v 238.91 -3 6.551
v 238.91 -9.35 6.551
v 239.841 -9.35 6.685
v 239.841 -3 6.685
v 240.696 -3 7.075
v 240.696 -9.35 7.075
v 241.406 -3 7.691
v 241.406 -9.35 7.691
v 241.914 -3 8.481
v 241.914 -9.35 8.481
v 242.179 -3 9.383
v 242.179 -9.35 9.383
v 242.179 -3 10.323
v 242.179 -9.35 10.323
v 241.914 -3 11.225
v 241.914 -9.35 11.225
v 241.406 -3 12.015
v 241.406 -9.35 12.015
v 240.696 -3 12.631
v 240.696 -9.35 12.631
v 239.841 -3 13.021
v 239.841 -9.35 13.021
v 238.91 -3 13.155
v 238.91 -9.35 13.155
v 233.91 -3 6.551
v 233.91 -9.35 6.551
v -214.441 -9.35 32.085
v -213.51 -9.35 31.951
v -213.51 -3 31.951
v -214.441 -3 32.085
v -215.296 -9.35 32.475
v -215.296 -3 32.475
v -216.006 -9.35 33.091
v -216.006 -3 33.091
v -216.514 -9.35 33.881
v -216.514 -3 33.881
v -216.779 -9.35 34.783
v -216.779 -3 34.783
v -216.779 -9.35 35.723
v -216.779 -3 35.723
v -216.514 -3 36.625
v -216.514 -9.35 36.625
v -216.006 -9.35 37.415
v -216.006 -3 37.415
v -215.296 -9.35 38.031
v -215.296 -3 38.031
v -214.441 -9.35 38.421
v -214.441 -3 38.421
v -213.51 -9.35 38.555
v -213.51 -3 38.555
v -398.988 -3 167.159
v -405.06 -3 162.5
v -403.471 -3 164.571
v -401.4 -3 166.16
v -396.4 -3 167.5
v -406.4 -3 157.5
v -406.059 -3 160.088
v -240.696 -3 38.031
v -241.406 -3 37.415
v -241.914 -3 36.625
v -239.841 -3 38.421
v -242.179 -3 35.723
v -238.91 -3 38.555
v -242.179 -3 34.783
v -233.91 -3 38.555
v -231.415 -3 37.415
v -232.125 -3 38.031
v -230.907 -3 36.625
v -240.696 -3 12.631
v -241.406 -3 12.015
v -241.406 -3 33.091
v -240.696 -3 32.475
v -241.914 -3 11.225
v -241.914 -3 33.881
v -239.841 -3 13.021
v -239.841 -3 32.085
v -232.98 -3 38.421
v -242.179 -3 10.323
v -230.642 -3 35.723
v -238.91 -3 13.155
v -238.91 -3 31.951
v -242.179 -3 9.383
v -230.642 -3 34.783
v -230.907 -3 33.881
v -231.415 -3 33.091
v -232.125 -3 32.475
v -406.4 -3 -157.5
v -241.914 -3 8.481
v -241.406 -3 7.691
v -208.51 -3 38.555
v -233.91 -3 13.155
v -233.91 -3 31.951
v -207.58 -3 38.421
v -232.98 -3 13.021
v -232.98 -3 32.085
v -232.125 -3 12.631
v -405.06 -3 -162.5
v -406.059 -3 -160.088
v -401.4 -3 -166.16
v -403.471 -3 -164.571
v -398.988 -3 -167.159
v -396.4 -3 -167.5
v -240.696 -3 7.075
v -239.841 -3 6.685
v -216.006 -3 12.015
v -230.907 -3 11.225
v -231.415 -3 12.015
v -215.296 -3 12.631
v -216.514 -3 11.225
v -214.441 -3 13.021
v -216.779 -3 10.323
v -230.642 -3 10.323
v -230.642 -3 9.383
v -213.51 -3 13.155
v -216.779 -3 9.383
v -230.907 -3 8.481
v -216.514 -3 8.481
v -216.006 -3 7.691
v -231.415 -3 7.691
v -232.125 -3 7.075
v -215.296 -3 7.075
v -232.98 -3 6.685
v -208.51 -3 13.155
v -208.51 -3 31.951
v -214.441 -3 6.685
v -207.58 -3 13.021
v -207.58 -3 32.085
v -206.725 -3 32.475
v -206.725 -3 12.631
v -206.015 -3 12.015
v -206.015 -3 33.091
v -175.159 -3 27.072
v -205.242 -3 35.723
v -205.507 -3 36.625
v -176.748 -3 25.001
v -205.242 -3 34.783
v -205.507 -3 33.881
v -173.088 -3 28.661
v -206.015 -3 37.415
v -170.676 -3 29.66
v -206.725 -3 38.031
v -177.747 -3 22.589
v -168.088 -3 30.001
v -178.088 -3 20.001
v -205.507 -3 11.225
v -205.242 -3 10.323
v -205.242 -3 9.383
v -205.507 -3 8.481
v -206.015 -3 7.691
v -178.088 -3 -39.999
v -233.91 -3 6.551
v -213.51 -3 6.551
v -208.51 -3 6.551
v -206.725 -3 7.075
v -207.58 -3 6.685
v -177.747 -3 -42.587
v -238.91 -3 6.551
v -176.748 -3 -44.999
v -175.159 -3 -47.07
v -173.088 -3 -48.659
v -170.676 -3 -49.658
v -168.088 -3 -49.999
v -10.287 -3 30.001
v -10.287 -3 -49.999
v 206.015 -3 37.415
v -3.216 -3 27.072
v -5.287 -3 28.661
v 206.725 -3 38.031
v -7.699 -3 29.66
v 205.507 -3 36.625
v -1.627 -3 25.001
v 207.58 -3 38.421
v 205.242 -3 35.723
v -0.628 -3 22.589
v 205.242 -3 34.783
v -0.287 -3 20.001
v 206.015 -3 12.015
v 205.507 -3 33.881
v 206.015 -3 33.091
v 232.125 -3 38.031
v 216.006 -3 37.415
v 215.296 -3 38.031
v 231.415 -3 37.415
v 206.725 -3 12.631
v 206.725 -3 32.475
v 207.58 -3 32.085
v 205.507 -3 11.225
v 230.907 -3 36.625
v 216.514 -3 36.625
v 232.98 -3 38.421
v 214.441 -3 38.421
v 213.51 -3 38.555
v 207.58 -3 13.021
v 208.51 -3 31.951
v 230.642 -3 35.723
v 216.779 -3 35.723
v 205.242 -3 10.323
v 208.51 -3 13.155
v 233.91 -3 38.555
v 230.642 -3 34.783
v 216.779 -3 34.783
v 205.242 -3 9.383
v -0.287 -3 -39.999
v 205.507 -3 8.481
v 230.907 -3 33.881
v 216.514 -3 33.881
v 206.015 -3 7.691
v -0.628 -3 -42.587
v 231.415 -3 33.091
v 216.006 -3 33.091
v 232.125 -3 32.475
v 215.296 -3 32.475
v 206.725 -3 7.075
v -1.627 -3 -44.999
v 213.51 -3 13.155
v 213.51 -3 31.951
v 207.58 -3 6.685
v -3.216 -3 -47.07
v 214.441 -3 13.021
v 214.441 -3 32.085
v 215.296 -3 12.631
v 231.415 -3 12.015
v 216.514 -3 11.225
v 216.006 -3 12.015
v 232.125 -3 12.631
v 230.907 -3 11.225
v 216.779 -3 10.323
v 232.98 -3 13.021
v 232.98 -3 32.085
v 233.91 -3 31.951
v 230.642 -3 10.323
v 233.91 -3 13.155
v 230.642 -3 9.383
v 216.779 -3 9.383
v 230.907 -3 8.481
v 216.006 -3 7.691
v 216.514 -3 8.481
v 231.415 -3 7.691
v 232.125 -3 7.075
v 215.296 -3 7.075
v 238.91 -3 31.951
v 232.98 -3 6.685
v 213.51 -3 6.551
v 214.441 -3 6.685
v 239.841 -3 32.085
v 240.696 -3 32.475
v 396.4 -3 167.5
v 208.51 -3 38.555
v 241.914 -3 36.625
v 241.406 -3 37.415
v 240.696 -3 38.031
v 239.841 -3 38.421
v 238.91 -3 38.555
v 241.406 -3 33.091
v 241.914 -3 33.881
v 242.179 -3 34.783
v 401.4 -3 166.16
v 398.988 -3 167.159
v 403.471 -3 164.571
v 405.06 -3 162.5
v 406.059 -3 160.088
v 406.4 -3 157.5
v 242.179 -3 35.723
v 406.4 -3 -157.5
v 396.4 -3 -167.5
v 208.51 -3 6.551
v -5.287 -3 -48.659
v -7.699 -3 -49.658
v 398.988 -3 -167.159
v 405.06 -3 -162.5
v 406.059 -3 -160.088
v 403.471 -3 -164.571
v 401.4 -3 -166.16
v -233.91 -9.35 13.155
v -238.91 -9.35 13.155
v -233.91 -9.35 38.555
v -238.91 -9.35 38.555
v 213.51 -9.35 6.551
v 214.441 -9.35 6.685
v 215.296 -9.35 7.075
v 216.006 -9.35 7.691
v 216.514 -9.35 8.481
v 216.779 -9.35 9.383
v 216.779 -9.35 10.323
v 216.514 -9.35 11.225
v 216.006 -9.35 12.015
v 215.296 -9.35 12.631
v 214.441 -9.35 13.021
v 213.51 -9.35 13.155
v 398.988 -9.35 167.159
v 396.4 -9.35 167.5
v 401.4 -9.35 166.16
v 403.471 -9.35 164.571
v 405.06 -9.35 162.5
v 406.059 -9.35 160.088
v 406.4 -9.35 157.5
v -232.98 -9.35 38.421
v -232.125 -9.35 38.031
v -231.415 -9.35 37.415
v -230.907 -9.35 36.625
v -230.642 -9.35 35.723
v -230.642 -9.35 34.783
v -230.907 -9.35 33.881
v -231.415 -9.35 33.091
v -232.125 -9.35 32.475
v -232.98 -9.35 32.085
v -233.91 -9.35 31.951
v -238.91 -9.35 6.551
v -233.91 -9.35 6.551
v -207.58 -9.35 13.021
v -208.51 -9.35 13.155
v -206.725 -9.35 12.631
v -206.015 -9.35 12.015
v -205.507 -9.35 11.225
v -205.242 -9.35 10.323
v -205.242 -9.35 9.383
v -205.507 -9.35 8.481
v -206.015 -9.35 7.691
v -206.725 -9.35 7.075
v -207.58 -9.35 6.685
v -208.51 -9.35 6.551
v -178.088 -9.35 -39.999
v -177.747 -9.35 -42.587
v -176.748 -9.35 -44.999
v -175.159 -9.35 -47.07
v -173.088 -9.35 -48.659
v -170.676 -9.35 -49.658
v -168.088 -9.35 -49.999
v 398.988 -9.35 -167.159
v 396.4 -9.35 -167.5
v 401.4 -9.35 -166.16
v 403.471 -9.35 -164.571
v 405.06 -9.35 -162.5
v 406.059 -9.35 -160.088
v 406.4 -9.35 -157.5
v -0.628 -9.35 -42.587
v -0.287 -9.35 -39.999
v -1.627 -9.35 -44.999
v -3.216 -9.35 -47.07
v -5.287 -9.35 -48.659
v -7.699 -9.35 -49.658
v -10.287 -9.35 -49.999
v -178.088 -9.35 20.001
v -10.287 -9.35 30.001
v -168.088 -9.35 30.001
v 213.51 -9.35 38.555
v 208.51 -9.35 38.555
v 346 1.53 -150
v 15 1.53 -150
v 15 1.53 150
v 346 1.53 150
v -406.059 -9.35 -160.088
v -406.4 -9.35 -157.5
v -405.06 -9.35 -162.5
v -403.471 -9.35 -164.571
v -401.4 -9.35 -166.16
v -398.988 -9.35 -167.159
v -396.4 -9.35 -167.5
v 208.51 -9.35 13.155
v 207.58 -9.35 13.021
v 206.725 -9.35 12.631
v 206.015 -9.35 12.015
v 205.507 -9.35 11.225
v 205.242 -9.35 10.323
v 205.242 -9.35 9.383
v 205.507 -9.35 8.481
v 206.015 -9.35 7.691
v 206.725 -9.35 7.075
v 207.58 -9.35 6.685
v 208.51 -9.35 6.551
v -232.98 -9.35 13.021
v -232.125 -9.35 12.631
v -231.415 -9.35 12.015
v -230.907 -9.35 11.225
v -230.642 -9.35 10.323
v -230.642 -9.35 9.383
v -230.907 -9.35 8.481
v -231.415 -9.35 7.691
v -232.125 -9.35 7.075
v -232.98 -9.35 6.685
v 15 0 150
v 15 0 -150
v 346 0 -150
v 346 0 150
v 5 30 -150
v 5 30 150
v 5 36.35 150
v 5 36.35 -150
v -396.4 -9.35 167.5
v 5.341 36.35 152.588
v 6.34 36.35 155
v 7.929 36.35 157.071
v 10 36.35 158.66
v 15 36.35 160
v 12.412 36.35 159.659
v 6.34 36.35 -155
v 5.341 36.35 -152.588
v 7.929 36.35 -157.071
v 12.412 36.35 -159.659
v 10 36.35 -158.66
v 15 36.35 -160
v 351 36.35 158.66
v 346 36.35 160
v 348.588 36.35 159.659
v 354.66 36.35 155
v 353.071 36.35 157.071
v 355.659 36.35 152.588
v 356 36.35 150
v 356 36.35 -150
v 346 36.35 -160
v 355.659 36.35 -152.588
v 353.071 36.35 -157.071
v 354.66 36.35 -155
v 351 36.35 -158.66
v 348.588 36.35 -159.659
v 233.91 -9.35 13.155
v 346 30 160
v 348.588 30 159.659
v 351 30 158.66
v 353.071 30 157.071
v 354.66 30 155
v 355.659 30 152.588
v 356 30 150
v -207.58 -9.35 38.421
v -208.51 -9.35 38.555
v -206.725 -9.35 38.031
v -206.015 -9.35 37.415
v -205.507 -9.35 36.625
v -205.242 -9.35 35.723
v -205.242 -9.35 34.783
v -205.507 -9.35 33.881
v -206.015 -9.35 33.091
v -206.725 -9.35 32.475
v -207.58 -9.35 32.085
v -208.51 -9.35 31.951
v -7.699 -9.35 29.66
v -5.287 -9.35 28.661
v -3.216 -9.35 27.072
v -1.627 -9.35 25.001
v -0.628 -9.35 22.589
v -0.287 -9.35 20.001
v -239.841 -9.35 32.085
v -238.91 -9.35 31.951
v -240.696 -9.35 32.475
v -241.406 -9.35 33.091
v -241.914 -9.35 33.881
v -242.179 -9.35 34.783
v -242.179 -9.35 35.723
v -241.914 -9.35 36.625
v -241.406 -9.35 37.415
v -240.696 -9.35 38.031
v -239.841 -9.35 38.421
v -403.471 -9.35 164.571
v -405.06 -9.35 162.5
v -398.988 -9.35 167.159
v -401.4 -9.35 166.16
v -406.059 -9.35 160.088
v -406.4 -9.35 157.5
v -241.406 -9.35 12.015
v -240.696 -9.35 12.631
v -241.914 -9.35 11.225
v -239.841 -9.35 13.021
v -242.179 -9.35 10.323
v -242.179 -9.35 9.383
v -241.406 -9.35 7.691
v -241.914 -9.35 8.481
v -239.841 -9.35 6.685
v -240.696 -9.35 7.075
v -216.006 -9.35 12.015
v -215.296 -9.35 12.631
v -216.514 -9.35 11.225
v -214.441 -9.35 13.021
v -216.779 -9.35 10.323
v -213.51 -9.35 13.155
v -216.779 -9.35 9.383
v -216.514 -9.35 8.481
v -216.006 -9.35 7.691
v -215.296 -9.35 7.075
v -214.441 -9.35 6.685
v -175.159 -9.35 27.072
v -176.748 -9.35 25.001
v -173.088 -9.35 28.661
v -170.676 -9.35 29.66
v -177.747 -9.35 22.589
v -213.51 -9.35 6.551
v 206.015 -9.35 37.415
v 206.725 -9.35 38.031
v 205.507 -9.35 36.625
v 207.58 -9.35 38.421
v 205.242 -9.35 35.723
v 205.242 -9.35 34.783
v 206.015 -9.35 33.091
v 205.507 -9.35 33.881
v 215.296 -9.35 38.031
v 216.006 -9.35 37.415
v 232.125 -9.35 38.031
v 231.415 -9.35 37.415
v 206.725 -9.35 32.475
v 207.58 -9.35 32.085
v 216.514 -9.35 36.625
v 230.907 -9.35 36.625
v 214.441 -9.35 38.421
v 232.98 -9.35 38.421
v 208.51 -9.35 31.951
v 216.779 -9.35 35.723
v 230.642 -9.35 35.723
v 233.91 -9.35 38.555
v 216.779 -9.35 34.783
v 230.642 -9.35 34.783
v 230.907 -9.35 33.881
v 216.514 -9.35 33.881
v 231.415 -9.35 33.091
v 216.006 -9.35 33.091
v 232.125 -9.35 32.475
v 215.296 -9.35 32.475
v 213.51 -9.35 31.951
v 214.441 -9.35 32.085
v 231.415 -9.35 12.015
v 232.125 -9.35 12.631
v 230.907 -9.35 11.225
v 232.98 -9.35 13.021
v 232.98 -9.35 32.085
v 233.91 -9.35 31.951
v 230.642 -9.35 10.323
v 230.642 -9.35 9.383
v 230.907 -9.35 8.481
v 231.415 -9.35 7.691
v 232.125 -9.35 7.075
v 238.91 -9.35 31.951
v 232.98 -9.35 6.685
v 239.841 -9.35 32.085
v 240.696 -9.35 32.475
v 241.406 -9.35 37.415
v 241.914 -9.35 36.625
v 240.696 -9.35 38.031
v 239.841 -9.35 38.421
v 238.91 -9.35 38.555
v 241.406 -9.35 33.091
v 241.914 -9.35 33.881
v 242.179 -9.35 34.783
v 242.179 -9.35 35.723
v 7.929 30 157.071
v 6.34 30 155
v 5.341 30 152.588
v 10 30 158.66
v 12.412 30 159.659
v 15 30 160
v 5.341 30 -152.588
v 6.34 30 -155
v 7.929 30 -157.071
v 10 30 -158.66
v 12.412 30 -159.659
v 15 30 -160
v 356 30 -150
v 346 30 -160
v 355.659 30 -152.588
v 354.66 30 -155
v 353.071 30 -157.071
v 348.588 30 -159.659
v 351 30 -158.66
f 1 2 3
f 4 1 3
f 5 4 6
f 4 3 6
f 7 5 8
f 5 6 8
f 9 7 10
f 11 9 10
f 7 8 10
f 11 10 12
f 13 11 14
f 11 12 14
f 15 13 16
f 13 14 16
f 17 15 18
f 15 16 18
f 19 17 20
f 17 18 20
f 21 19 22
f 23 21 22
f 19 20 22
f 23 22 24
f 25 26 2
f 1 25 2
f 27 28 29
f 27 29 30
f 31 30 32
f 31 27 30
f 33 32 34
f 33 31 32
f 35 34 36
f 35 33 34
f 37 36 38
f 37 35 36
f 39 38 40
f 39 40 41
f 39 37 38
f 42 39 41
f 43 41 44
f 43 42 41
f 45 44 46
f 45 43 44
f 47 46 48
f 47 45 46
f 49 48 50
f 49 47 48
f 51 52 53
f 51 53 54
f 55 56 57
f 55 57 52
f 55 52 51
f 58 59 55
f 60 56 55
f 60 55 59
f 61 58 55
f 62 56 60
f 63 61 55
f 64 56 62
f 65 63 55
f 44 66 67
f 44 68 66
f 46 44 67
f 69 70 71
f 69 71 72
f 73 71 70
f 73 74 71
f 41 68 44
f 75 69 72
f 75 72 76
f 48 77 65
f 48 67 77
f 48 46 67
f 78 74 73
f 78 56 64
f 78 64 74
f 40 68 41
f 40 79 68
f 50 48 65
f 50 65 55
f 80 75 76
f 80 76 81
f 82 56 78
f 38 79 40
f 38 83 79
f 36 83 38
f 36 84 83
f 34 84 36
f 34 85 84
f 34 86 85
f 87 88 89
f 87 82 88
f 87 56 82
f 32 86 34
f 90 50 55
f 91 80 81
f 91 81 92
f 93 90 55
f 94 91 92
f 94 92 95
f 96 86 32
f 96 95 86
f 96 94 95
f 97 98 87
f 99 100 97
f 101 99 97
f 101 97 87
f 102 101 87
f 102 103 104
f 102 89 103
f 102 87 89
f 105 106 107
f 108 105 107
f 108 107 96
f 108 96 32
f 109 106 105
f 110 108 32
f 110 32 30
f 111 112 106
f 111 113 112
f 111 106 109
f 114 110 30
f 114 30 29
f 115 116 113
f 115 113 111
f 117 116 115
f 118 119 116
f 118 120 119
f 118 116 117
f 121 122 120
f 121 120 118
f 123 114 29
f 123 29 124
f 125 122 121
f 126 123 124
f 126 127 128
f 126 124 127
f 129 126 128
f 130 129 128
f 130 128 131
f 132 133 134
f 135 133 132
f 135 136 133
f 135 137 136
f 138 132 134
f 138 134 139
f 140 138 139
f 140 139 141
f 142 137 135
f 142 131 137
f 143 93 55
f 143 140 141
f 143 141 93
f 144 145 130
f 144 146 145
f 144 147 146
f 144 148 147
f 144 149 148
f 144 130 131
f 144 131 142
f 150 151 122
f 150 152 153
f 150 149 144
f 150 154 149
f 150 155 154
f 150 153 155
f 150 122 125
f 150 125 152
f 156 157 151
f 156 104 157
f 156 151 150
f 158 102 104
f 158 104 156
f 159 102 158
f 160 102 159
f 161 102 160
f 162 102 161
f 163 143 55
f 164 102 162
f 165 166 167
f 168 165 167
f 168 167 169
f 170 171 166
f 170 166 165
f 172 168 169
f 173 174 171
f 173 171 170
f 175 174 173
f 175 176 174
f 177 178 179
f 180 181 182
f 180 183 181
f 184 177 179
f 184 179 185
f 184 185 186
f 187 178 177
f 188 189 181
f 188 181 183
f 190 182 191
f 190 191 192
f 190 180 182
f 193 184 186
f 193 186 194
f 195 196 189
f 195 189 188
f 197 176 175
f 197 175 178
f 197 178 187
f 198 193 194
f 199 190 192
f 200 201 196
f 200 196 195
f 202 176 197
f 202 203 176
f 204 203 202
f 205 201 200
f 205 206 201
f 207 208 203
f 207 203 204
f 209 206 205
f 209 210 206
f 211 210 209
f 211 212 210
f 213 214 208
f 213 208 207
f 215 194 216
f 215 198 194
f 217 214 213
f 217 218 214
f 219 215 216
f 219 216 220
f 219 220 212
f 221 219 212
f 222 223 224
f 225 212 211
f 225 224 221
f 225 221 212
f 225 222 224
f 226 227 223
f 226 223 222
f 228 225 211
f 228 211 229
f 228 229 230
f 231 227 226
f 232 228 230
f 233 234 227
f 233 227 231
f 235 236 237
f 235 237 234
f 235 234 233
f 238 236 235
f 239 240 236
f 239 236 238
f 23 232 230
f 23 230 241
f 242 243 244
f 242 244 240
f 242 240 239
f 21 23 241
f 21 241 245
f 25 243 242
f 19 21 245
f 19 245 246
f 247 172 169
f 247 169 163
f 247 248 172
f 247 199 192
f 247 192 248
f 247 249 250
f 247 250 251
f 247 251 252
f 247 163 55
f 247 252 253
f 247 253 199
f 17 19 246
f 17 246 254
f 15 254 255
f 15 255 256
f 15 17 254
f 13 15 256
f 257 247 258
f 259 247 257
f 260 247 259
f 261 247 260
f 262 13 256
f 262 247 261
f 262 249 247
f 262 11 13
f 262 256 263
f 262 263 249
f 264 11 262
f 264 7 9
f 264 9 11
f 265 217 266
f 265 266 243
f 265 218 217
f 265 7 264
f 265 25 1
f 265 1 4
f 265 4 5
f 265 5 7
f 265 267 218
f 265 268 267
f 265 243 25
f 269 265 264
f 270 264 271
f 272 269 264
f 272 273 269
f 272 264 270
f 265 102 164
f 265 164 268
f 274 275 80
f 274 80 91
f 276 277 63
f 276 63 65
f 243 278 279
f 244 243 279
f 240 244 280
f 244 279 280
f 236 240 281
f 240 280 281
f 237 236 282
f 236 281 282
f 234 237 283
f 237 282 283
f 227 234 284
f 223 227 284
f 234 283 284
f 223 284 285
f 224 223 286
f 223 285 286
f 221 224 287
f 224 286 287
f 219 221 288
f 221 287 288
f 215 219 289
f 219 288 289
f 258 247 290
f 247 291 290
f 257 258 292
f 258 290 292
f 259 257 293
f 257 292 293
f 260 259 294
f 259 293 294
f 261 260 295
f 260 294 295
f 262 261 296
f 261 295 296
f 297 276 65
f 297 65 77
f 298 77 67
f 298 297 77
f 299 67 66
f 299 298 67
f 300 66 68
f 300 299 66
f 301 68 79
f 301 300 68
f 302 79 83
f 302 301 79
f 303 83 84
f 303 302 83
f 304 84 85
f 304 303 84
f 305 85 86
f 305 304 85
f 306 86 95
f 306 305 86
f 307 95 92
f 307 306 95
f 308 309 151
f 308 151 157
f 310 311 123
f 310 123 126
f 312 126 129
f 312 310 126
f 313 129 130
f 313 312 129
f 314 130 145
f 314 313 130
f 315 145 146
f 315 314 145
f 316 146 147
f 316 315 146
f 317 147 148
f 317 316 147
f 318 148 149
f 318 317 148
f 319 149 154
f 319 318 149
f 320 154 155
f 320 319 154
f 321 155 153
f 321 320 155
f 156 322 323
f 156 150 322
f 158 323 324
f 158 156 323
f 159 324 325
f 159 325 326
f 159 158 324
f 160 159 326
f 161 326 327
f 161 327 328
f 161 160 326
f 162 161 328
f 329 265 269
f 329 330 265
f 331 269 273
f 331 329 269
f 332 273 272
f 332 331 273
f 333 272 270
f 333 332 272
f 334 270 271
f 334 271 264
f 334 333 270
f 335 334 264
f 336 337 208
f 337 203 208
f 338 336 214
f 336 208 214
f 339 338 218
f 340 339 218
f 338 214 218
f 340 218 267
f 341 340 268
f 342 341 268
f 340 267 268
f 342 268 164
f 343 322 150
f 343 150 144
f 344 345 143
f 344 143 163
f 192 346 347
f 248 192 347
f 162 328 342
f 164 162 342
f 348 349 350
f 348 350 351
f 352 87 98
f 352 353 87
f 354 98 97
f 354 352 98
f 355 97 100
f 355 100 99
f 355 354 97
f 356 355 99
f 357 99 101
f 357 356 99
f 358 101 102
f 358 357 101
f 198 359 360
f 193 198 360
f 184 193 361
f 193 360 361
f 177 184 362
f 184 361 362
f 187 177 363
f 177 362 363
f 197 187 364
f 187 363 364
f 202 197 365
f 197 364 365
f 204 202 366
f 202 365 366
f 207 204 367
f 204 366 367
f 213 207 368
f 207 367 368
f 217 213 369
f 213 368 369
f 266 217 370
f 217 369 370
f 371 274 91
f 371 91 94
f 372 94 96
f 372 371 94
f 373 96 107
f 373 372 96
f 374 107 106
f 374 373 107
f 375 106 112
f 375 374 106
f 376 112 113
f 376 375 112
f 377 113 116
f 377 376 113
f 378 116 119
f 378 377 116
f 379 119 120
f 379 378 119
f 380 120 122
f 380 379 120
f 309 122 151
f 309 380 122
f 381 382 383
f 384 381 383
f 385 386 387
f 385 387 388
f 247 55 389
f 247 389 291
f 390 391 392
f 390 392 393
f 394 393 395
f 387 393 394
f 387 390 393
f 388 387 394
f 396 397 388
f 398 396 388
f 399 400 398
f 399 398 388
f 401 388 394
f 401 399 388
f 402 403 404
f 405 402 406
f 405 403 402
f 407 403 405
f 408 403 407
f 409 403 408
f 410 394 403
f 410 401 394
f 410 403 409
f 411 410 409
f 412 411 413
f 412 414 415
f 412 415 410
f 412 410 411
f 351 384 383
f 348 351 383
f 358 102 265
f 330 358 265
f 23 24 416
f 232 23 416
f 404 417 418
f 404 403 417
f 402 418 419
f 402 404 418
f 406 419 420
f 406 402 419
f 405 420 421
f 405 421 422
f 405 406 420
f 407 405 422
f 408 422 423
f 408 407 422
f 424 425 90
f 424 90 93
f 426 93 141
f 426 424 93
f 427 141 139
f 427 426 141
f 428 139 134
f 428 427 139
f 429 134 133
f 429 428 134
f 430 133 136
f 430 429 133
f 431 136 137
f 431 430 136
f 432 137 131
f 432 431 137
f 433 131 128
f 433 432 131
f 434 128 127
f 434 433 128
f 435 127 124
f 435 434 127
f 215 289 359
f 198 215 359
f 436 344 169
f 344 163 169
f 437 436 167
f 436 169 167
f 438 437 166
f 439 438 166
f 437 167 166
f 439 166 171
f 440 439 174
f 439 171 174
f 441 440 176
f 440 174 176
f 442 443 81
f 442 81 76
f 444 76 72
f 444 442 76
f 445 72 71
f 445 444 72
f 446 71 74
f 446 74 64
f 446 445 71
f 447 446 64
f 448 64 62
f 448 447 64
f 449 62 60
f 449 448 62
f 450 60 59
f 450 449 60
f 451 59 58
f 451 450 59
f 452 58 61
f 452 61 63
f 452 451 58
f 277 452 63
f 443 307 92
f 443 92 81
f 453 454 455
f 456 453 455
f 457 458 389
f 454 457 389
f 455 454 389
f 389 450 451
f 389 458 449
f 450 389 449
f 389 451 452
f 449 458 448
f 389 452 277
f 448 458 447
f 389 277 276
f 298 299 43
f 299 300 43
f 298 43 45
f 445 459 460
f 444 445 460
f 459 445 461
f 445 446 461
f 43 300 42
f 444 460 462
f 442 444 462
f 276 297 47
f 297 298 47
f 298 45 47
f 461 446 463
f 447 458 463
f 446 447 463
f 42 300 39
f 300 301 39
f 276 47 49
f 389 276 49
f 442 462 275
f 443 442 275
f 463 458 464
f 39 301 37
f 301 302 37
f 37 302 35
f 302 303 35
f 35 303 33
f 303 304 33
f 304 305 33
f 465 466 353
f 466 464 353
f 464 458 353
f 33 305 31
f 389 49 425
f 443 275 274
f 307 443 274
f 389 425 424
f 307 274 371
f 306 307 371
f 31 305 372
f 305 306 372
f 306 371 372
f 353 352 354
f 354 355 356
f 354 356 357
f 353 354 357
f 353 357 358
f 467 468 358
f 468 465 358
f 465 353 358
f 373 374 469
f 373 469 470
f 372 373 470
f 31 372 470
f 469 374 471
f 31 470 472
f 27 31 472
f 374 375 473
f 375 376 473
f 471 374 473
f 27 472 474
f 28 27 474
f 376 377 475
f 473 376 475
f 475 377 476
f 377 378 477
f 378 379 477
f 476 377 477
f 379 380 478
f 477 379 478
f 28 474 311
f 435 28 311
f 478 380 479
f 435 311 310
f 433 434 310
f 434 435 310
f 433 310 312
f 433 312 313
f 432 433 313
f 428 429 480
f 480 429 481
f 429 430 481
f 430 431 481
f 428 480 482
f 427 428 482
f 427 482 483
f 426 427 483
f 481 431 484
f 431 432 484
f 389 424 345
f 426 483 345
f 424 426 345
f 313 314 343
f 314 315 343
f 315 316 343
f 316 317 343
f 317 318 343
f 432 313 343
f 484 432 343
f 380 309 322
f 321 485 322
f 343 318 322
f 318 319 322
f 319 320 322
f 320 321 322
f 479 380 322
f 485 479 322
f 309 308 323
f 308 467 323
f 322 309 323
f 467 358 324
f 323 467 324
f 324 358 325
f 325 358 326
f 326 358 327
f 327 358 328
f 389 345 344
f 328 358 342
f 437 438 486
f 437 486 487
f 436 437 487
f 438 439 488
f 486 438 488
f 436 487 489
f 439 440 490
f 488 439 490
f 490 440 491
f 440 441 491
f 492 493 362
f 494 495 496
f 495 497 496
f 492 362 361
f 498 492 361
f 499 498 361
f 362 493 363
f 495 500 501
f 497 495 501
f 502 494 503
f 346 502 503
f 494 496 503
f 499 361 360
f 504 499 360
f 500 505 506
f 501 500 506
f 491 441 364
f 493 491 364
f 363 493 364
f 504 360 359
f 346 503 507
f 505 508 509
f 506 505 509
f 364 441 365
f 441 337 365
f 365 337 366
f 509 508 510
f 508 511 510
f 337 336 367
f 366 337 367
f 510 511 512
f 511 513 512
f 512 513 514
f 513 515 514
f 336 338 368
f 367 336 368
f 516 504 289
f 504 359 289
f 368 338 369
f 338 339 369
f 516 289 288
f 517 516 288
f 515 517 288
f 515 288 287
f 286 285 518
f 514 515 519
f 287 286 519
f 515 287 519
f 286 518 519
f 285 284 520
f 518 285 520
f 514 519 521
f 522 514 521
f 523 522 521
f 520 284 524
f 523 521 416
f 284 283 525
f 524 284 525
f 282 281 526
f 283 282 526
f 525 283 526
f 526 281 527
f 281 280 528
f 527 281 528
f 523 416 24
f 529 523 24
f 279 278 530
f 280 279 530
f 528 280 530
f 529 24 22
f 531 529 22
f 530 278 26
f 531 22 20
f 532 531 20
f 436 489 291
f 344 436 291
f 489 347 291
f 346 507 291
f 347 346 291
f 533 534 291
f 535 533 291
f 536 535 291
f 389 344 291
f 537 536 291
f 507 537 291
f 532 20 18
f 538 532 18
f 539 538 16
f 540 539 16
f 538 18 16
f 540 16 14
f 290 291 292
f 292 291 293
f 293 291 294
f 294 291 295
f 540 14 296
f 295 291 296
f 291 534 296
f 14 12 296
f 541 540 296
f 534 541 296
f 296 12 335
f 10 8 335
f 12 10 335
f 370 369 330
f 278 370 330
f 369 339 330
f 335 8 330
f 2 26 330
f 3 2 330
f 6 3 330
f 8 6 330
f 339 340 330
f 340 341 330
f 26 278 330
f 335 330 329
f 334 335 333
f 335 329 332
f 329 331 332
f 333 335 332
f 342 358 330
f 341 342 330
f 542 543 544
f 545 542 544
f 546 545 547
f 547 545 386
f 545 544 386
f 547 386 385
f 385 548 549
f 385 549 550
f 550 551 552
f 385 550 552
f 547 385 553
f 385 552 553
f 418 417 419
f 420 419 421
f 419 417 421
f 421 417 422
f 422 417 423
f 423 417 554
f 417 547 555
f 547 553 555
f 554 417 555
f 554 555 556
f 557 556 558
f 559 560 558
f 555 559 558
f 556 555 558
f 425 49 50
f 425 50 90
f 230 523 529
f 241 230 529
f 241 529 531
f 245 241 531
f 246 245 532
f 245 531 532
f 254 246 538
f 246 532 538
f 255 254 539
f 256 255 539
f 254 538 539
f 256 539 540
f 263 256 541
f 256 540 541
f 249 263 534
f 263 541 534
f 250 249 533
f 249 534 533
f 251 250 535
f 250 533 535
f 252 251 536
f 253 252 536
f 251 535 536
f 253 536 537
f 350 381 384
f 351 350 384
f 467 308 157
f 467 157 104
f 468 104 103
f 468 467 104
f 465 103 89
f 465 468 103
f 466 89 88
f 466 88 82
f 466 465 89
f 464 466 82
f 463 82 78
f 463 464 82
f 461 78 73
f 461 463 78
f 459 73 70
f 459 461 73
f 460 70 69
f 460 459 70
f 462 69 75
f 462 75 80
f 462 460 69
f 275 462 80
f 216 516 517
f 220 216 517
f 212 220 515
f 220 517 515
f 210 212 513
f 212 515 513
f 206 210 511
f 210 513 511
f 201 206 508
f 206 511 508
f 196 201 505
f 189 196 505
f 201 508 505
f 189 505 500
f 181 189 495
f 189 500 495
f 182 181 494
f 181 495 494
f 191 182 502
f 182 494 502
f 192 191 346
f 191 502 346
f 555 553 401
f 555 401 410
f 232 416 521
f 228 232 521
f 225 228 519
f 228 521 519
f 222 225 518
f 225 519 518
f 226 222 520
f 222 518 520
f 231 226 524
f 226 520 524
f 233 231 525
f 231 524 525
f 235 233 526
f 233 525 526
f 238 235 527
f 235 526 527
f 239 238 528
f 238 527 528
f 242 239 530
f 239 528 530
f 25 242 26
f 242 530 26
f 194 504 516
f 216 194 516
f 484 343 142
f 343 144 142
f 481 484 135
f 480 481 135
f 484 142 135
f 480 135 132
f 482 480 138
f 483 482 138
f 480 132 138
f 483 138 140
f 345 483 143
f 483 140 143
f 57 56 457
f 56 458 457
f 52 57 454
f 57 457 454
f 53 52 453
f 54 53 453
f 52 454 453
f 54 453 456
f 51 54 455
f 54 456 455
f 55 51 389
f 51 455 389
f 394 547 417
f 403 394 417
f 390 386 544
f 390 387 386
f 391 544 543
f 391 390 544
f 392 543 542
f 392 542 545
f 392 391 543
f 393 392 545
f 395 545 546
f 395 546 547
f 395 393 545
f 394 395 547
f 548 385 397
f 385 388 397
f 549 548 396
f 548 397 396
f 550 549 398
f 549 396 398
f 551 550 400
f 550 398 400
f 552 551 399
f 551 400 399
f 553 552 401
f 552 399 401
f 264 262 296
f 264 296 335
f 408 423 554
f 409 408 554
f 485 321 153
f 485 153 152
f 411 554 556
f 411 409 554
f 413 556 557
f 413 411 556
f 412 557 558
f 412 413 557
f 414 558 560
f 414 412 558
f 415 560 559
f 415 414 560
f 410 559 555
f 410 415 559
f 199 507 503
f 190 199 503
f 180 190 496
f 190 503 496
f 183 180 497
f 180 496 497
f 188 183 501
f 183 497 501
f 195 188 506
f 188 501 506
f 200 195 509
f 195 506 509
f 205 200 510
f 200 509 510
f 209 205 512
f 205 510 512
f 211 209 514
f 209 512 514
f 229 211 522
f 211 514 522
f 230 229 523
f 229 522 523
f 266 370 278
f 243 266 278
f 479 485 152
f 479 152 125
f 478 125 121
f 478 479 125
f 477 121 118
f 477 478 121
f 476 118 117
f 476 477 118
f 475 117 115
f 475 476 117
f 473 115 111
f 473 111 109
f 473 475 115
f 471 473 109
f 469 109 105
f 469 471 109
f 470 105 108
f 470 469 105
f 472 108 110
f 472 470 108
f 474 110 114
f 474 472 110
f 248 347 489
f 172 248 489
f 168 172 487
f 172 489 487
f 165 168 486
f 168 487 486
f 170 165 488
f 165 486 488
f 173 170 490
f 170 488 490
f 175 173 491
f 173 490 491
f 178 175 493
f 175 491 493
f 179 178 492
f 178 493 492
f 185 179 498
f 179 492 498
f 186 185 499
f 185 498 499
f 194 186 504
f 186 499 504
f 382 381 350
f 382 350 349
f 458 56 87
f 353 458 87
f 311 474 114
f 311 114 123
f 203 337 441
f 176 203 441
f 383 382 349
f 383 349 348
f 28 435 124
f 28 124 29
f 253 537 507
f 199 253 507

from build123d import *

# Parameters (mm, degrees)
SKETCH1_W           = 331
SKETCH1_H           = 300
BOSS_EXTRUDE1_DEPTH = 1.53
SKETCH3_W           = 812.8
SKETCH3_H           = 335
BOSS_EXTRUDE2_DEPTH = 6.35
CUT_EXTRUDE1_DEPTH  = 6.35
FILLET1_R           = 10
BOSS_EXTRUDE3_START = 30
SKETCH5_W           = 351
SKETCH5_H           = 320
BOSS_EXTRUDE3_DEPTH = 6.35
FILLET2_R           = 10
SKETCH6_W           = 177.8
SKETCH6_H           = 80
CUT_EXTRUDE2_DEPTH  = 6.35
FILLET3_R           = 10


with BuildPart() as part:
    # Sketch1 → Boss-Extrude1 (new body)
    with BuildSketch(Plane(origin=(0, 0, 0), x_dir=(1, 0, 0), z_dir=(0, 1, 0))):
        with Locations((180.5, 0)):
            Rectangle(SKETCH1_W, SKETCH1_H)
    extrude(amount=BOSS_EXTRUDE1_DEPTH)


with BuildPart() as body_2:
    # Sketch3 → Boss-Extrude2 (new body)
    with BuildSketch(Plane(origin=(0, -3, 0), x_dir=(1, 0, 0), z_dir=(0, 1, 0))):
        Rectangle(SKETCH3_W, SKETCH3_H)
    extrude(amount=-BOSS_EXTRUDE2_DEPTH)

    # Sketch4 → Cut-Extrude1 (cut)
    with BuildSketch(Plane.XZ.offset(9.35)):
        with BuildLine():
            Line((-208.5105, 6.550865079), (-213.5105, 6.550865079))
            ThreePointArc((-213.5105, 6.550865079), (-216.8125, 9.852865079), (-213.5105, 13.154865079))
            Line((-213.5105, 13.154865079), (-208.5105, 13.154865079))
            ThreePointArc((-208.5105, 13.154865079), (-205.2085, 9.852865079), (-208.5105, 6.550865079))
        make_face()
        with BuildLine():
            Line((-233.9105, 6.550865079), (-238.9105, 6.550865079))
            ThreePointArc((-238.9105, 6.550865079), (-242.2125, 9.852865079), (-238.9105, 13.154865079))
            Line((-238.9105, 13.154865079), (-233.9105, 13.154865079))
            ThreePointArc((-233.9105, 13.154865079), (-230.6085, 9.852865079), (-233.9105, 6.550865079))
        make_face()
        with BuildLine():
            Line((-208.5105, 31.950865079), (-213.5105, 31.950865079))
            ThreePointArc((-213.5105, 31.950865079), (-216.8125, 35.252865079), (-213.5105, 38.554865079))
            Line((-213.5105, 38.554865079), (-208.5105, 38.554865079))
            ThreePointArc((-208.5105, 38.554865079), (-205.2085, 35.252865079), (-208.5105, 31.950865079))
        make_face()
        with BuildLine():
            Line((-233.9105, 31.950865079), (-238.9105, 31.950865079))
            ThreePointArc((-238.9105, 31.950865079), (-242.2125, 35.252865079), (-238.9105, 38.554865079))
            Line((-238.9105, 38.554865079), (-233.9105, 38.554865079))
            ThreePointArc((-233.9105, 38.554865079), (-230.6085, 35.252865079), (-233.9105, 31.950865079))
        make_face()
    cut_extrude1 = extrude(amount=-CUT_EXTRUDE1_DEPTH, mode=Mode.SUBTRACT)

    # Mirror1: Cut-Extrude1 across plane
    add(cut_extrude1.mirror(Plane.ZY), mode=Mode.SUBTRACT)

    # Fillet1
    fillet1_edges = [body_2.edges().sort_by_distance(p)[0] for p in [
        (406.4, -6.175, 167.5),
        (-406.4, -6.175, 167.5),
        (-406.4, -6.175, -167.5),
        (406.4, -6.175, -167.5),
    ]]
    fillet(fillet1_edges, radius=FILLET1_R)

    # Sketch6 → Cut-Extrude2 (cut)
    with BuildSketch(Plane.XZ.offset(9.35)):
        with Locations((-89.1875, -9.999173431)):
            Rectangle(SKETCH6_W, SKETCH6_H)
    extrude(amount=-CUT_EXTRUDE2_DEPTH, mode=Mode.SUBTRACT)

    # Fillet3
    fillet3_edges = [body_2.edges().sort_by_distance(p)[0] for p in [
        (-0.2875, -6.175, 30.000826569),
        (-0.2875, -6.175, -49.999173431),
        (-178.0875, -6.175, -49.999173431),
        (-178.0875, -6.175, 30.000826569),
    ]]
    fillet(fillet3_edges, radius=FILLET3_R)


with BuildPart() as body_3:
    # Sketch5 → Boss-Extrude3 (new body)
    with BuildSketch(Plane(origin=(0, 0, 0), x_dir=(1, 0, 0), z_dir=(0, 1, 0)).offset(BOSS_EXTRUDE3_START)):
        with Locations((180.5, 0)):
            Rectangle(SKETCH5_W, SKETCH5_H)
    extrude(amount=BOSS_EXTRUDE3_DEPTH)

    # Fillet2
    fillet2_edges = [body_3.edges().sort_by_distance(p)[0] for p in [
        (5, 33.175, 160),
        (5, 33.175, -160),
        (356, 33.175, -160),
        (356, 33.175, 160),
    ]]
    fillet(fillet2_edges, radius=FILLET2_R)


solid = Compound([part.part, body_2.part, body_3.part])
